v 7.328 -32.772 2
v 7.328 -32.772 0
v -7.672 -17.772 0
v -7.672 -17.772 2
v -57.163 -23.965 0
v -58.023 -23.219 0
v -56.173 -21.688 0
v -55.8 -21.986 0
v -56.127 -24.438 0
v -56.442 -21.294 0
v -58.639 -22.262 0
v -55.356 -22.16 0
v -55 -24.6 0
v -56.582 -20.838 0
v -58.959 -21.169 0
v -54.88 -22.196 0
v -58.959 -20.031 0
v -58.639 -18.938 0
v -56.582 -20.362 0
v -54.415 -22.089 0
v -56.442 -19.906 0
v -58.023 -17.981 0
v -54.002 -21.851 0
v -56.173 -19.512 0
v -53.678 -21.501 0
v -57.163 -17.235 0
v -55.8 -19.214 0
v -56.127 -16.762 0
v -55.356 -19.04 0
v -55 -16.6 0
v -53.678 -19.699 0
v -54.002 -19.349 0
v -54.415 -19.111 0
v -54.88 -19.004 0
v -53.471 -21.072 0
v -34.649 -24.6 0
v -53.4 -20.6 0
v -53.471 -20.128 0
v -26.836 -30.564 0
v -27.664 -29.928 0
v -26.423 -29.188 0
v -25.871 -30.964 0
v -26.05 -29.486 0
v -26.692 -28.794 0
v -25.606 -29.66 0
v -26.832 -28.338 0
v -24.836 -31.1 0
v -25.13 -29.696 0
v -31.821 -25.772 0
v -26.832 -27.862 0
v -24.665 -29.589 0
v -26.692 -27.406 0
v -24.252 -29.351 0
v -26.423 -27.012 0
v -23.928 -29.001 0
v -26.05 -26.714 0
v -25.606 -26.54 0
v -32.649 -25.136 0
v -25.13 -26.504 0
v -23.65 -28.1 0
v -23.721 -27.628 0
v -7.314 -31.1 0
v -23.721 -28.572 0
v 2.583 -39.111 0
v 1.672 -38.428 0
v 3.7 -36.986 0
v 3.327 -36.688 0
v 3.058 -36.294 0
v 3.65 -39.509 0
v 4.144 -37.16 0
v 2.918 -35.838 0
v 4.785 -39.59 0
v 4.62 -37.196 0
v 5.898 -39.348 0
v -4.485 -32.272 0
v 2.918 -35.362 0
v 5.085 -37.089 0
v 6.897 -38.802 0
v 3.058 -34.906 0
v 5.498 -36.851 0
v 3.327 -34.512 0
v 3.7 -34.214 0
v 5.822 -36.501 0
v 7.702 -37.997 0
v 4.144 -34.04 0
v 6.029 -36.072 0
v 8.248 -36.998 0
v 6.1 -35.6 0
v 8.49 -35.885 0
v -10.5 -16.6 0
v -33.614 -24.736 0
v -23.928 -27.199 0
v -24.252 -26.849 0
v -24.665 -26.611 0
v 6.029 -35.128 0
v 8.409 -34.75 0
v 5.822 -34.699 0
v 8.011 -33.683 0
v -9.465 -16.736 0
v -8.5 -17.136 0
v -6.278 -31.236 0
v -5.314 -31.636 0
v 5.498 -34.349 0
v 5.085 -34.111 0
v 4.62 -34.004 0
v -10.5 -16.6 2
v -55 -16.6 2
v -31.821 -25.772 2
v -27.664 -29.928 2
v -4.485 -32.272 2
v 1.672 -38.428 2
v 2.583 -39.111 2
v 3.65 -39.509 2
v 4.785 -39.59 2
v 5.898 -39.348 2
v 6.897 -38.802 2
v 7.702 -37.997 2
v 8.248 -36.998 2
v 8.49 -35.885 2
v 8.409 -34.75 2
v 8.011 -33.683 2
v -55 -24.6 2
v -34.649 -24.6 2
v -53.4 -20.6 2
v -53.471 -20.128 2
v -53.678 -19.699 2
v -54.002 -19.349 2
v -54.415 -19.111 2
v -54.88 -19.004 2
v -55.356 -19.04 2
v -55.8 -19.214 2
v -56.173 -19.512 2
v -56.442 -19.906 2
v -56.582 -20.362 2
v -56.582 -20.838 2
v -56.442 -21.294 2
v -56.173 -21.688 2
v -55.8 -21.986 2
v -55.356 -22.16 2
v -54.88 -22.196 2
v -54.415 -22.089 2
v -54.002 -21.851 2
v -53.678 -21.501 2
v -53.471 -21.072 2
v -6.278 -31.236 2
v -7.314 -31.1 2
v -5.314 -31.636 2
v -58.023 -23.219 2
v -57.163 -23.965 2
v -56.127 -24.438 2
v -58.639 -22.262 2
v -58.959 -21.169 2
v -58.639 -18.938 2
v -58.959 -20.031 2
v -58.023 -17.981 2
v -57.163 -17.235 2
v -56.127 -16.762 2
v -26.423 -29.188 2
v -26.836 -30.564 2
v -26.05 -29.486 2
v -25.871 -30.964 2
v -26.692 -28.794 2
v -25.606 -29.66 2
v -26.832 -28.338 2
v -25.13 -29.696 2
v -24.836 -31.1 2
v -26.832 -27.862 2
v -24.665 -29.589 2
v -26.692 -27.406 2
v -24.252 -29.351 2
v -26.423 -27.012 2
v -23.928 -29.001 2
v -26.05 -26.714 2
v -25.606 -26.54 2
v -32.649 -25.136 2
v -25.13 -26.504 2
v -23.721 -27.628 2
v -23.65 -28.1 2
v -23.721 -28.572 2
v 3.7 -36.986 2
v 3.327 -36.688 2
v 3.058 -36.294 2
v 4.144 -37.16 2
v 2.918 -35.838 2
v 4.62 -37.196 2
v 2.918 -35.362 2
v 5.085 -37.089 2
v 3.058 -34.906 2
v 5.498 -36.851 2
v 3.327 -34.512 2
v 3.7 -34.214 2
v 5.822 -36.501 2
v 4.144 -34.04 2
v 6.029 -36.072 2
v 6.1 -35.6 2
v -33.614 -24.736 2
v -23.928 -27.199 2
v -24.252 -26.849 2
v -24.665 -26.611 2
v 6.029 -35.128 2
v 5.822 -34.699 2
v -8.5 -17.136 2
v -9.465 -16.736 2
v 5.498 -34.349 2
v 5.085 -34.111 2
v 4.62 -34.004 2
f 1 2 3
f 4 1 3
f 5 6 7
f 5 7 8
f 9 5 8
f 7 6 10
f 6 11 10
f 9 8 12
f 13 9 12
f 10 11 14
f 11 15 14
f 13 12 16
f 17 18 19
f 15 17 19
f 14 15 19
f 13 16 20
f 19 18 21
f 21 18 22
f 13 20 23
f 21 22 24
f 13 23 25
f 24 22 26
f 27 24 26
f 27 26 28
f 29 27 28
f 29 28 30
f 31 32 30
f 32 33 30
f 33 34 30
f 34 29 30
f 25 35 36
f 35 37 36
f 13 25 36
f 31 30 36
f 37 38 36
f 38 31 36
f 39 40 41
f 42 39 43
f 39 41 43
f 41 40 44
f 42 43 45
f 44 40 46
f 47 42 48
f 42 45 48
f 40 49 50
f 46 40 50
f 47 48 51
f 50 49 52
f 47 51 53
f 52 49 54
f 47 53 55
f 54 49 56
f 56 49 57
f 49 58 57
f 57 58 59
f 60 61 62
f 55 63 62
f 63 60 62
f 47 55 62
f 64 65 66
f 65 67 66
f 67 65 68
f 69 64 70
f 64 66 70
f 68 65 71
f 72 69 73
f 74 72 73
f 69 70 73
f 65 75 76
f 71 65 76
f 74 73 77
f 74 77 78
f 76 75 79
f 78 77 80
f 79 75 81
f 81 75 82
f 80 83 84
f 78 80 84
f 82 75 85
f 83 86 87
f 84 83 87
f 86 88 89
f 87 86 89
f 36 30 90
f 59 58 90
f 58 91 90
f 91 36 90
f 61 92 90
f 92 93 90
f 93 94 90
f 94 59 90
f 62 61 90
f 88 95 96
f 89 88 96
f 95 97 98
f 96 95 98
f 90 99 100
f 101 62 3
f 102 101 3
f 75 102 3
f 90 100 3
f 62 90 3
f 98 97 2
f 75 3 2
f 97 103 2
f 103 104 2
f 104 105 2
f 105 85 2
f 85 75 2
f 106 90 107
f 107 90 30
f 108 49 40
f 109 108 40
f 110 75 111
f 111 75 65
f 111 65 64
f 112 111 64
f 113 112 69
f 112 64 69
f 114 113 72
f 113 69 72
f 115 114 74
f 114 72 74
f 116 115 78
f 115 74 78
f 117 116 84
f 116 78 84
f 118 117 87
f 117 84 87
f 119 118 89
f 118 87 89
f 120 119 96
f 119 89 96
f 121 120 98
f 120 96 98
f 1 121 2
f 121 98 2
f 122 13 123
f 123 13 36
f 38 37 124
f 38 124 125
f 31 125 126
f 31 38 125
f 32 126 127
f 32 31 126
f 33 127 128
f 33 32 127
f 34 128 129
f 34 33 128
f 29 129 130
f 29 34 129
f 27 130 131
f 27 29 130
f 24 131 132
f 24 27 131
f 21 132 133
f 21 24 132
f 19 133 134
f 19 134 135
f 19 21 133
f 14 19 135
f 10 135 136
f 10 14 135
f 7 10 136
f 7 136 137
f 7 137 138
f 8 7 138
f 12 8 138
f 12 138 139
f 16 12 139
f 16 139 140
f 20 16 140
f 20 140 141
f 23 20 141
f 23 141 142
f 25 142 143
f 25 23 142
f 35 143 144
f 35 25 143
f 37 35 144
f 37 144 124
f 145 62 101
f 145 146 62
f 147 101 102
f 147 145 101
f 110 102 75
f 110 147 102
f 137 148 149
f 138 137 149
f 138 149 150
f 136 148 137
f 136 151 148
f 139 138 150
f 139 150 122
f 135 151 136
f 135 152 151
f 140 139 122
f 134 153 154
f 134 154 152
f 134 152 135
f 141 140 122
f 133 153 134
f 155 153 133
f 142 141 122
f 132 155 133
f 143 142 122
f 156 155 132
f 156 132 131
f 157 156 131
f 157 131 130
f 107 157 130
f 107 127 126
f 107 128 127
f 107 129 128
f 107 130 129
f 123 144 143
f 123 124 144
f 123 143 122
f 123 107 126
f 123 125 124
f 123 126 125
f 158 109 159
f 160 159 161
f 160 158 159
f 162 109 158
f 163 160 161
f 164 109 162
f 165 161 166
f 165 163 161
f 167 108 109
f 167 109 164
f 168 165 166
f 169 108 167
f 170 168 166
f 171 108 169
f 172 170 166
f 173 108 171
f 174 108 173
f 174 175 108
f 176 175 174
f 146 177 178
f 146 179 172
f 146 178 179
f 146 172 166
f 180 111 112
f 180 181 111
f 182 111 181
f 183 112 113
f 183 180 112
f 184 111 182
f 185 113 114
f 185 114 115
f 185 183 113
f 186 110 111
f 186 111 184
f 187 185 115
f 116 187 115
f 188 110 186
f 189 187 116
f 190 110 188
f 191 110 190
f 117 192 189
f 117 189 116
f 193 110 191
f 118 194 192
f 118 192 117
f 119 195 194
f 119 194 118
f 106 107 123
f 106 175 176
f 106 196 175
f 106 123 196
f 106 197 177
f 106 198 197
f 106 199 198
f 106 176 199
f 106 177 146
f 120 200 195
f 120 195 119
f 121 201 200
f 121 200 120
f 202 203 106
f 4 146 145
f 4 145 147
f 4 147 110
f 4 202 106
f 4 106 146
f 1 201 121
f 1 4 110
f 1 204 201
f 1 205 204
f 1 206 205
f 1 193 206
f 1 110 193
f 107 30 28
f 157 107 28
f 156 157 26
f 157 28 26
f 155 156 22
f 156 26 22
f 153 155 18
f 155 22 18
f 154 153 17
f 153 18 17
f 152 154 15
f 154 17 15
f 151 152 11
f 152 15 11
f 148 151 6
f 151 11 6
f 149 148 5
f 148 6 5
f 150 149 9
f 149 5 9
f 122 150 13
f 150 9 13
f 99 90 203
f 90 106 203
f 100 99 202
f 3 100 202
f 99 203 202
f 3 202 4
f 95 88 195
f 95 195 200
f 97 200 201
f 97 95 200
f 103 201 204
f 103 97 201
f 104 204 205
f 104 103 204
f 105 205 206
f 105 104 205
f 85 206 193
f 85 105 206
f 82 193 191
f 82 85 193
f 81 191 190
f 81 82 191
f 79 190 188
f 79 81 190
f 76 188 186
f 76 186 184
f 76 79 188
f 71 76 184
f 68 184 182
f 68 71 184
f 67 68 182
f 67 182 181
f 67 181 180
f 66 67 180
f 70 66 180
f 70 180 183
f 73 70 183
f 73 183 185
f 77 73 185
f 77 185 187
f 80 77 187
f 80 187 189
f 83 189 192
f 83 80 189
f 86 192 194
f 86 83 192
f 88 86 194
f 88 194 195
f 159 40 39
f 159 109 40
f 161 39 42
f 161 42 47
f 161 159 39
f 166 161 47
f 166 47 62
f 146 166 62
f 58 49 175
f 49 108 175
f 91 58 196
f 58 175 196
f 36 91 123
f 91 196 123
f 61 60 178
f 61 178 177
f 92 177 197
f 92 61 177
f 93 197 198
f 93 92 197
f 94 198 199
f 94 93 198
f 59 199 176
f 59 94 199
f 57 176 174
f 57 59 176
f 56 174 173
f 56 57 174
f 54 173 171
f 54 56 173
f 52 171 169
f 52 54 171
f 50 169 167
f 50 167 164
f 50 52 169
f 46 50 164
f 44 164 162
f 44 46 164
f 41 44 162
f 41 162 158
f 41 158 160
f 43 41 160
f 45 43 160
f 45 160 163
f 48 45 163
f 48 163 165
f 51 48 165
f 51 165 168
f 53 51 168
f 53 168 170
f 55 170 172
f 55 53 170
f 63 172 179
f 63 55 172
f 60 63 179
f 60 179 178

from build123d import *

# Parameters (mm, degrees)
SKETCH1_R           = 1.6
BOSS_EXTRUDE1_DEPTH = 2
FILLET1_R           = 4


with BuildPart() as part:
    # Sketch1 → Boss-Extrude1 (new body)
    with BuildSketch(Plane.XY):
        with BuildLine():
            Line((-32.992640687, -24.6), (-26.492640687, -31.1))
            Line((-26.492640687, -31.1), (-5.656854249, -31.1))
            Line((-5.656854249, -31.1), (1.671572875, -38.428427125))
            ThreePointArc((1.671572875, -38.428427125), (7.328427125, -38.428427125), (7.328427125, -32.771572875))
            Line((7.328427125, -32.771572875), (-8.843145751, -16.6))
            Line((-8.843145751, -16.6), (-55, -16.6))
            ThreePointArc((-55, -16.6), (-59, -20.6), (-55, -24.6))
            Line((-55, -24.6), (-32.992640687, -24.6))
        make_face()
        with Locations((-25.25, -28.1)):
            Circle(SKETCH1_R, mode=Mode.SUBTRACT)
        with Locations((4.5, -35.6)):
            Circle(SKETCH1_R, mode=Mode.SUBTRACT)
        with Locations((-55, -20.6)):
            Circle(SKETCH1_R, mode=Mode.SUBTRACT)
    extrude(amount=BOSS_EXTRUDE1_DEPTH)

    # Fillet1
    fillet1_edges = [part.edges().sort_by_distance(p)[0] for p in [
        (-8.843145751, -16.6, 1),
        (-5.656854249, -31.1, 1),
        (-26.492640687, -31.1, 1),
        (-32.992640687, -24.6, 1),
    ]]
    fillet(fillet1_edges, radius=FILLET1_R)


solid = part.part
